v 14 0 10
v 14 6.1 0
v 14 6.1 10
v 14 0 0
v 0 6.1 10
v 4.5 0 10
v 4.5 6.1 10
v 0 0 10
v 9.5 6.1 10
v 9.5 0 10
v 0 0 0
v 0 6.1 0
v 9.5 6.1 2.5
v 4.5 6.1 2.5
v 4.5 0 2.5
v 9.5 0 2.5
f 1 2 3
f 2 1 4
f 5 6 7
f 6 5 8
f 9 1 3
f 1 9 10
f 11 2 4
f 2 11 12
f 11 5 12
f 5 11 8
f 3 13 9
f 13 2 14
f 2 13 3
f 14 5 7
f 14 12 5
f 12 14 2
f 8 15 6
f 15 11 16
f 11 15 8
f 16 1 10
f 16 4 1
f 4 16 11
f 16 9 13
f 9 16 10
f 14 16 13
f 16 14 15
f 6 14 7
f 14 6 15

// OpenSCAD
color("black",a=1.0)
{
	difference()
	{
			cube([14,6.1,10]);
		translate([4.5,-0.5,2.5])
			cube([5,7,8]);
	}
}
